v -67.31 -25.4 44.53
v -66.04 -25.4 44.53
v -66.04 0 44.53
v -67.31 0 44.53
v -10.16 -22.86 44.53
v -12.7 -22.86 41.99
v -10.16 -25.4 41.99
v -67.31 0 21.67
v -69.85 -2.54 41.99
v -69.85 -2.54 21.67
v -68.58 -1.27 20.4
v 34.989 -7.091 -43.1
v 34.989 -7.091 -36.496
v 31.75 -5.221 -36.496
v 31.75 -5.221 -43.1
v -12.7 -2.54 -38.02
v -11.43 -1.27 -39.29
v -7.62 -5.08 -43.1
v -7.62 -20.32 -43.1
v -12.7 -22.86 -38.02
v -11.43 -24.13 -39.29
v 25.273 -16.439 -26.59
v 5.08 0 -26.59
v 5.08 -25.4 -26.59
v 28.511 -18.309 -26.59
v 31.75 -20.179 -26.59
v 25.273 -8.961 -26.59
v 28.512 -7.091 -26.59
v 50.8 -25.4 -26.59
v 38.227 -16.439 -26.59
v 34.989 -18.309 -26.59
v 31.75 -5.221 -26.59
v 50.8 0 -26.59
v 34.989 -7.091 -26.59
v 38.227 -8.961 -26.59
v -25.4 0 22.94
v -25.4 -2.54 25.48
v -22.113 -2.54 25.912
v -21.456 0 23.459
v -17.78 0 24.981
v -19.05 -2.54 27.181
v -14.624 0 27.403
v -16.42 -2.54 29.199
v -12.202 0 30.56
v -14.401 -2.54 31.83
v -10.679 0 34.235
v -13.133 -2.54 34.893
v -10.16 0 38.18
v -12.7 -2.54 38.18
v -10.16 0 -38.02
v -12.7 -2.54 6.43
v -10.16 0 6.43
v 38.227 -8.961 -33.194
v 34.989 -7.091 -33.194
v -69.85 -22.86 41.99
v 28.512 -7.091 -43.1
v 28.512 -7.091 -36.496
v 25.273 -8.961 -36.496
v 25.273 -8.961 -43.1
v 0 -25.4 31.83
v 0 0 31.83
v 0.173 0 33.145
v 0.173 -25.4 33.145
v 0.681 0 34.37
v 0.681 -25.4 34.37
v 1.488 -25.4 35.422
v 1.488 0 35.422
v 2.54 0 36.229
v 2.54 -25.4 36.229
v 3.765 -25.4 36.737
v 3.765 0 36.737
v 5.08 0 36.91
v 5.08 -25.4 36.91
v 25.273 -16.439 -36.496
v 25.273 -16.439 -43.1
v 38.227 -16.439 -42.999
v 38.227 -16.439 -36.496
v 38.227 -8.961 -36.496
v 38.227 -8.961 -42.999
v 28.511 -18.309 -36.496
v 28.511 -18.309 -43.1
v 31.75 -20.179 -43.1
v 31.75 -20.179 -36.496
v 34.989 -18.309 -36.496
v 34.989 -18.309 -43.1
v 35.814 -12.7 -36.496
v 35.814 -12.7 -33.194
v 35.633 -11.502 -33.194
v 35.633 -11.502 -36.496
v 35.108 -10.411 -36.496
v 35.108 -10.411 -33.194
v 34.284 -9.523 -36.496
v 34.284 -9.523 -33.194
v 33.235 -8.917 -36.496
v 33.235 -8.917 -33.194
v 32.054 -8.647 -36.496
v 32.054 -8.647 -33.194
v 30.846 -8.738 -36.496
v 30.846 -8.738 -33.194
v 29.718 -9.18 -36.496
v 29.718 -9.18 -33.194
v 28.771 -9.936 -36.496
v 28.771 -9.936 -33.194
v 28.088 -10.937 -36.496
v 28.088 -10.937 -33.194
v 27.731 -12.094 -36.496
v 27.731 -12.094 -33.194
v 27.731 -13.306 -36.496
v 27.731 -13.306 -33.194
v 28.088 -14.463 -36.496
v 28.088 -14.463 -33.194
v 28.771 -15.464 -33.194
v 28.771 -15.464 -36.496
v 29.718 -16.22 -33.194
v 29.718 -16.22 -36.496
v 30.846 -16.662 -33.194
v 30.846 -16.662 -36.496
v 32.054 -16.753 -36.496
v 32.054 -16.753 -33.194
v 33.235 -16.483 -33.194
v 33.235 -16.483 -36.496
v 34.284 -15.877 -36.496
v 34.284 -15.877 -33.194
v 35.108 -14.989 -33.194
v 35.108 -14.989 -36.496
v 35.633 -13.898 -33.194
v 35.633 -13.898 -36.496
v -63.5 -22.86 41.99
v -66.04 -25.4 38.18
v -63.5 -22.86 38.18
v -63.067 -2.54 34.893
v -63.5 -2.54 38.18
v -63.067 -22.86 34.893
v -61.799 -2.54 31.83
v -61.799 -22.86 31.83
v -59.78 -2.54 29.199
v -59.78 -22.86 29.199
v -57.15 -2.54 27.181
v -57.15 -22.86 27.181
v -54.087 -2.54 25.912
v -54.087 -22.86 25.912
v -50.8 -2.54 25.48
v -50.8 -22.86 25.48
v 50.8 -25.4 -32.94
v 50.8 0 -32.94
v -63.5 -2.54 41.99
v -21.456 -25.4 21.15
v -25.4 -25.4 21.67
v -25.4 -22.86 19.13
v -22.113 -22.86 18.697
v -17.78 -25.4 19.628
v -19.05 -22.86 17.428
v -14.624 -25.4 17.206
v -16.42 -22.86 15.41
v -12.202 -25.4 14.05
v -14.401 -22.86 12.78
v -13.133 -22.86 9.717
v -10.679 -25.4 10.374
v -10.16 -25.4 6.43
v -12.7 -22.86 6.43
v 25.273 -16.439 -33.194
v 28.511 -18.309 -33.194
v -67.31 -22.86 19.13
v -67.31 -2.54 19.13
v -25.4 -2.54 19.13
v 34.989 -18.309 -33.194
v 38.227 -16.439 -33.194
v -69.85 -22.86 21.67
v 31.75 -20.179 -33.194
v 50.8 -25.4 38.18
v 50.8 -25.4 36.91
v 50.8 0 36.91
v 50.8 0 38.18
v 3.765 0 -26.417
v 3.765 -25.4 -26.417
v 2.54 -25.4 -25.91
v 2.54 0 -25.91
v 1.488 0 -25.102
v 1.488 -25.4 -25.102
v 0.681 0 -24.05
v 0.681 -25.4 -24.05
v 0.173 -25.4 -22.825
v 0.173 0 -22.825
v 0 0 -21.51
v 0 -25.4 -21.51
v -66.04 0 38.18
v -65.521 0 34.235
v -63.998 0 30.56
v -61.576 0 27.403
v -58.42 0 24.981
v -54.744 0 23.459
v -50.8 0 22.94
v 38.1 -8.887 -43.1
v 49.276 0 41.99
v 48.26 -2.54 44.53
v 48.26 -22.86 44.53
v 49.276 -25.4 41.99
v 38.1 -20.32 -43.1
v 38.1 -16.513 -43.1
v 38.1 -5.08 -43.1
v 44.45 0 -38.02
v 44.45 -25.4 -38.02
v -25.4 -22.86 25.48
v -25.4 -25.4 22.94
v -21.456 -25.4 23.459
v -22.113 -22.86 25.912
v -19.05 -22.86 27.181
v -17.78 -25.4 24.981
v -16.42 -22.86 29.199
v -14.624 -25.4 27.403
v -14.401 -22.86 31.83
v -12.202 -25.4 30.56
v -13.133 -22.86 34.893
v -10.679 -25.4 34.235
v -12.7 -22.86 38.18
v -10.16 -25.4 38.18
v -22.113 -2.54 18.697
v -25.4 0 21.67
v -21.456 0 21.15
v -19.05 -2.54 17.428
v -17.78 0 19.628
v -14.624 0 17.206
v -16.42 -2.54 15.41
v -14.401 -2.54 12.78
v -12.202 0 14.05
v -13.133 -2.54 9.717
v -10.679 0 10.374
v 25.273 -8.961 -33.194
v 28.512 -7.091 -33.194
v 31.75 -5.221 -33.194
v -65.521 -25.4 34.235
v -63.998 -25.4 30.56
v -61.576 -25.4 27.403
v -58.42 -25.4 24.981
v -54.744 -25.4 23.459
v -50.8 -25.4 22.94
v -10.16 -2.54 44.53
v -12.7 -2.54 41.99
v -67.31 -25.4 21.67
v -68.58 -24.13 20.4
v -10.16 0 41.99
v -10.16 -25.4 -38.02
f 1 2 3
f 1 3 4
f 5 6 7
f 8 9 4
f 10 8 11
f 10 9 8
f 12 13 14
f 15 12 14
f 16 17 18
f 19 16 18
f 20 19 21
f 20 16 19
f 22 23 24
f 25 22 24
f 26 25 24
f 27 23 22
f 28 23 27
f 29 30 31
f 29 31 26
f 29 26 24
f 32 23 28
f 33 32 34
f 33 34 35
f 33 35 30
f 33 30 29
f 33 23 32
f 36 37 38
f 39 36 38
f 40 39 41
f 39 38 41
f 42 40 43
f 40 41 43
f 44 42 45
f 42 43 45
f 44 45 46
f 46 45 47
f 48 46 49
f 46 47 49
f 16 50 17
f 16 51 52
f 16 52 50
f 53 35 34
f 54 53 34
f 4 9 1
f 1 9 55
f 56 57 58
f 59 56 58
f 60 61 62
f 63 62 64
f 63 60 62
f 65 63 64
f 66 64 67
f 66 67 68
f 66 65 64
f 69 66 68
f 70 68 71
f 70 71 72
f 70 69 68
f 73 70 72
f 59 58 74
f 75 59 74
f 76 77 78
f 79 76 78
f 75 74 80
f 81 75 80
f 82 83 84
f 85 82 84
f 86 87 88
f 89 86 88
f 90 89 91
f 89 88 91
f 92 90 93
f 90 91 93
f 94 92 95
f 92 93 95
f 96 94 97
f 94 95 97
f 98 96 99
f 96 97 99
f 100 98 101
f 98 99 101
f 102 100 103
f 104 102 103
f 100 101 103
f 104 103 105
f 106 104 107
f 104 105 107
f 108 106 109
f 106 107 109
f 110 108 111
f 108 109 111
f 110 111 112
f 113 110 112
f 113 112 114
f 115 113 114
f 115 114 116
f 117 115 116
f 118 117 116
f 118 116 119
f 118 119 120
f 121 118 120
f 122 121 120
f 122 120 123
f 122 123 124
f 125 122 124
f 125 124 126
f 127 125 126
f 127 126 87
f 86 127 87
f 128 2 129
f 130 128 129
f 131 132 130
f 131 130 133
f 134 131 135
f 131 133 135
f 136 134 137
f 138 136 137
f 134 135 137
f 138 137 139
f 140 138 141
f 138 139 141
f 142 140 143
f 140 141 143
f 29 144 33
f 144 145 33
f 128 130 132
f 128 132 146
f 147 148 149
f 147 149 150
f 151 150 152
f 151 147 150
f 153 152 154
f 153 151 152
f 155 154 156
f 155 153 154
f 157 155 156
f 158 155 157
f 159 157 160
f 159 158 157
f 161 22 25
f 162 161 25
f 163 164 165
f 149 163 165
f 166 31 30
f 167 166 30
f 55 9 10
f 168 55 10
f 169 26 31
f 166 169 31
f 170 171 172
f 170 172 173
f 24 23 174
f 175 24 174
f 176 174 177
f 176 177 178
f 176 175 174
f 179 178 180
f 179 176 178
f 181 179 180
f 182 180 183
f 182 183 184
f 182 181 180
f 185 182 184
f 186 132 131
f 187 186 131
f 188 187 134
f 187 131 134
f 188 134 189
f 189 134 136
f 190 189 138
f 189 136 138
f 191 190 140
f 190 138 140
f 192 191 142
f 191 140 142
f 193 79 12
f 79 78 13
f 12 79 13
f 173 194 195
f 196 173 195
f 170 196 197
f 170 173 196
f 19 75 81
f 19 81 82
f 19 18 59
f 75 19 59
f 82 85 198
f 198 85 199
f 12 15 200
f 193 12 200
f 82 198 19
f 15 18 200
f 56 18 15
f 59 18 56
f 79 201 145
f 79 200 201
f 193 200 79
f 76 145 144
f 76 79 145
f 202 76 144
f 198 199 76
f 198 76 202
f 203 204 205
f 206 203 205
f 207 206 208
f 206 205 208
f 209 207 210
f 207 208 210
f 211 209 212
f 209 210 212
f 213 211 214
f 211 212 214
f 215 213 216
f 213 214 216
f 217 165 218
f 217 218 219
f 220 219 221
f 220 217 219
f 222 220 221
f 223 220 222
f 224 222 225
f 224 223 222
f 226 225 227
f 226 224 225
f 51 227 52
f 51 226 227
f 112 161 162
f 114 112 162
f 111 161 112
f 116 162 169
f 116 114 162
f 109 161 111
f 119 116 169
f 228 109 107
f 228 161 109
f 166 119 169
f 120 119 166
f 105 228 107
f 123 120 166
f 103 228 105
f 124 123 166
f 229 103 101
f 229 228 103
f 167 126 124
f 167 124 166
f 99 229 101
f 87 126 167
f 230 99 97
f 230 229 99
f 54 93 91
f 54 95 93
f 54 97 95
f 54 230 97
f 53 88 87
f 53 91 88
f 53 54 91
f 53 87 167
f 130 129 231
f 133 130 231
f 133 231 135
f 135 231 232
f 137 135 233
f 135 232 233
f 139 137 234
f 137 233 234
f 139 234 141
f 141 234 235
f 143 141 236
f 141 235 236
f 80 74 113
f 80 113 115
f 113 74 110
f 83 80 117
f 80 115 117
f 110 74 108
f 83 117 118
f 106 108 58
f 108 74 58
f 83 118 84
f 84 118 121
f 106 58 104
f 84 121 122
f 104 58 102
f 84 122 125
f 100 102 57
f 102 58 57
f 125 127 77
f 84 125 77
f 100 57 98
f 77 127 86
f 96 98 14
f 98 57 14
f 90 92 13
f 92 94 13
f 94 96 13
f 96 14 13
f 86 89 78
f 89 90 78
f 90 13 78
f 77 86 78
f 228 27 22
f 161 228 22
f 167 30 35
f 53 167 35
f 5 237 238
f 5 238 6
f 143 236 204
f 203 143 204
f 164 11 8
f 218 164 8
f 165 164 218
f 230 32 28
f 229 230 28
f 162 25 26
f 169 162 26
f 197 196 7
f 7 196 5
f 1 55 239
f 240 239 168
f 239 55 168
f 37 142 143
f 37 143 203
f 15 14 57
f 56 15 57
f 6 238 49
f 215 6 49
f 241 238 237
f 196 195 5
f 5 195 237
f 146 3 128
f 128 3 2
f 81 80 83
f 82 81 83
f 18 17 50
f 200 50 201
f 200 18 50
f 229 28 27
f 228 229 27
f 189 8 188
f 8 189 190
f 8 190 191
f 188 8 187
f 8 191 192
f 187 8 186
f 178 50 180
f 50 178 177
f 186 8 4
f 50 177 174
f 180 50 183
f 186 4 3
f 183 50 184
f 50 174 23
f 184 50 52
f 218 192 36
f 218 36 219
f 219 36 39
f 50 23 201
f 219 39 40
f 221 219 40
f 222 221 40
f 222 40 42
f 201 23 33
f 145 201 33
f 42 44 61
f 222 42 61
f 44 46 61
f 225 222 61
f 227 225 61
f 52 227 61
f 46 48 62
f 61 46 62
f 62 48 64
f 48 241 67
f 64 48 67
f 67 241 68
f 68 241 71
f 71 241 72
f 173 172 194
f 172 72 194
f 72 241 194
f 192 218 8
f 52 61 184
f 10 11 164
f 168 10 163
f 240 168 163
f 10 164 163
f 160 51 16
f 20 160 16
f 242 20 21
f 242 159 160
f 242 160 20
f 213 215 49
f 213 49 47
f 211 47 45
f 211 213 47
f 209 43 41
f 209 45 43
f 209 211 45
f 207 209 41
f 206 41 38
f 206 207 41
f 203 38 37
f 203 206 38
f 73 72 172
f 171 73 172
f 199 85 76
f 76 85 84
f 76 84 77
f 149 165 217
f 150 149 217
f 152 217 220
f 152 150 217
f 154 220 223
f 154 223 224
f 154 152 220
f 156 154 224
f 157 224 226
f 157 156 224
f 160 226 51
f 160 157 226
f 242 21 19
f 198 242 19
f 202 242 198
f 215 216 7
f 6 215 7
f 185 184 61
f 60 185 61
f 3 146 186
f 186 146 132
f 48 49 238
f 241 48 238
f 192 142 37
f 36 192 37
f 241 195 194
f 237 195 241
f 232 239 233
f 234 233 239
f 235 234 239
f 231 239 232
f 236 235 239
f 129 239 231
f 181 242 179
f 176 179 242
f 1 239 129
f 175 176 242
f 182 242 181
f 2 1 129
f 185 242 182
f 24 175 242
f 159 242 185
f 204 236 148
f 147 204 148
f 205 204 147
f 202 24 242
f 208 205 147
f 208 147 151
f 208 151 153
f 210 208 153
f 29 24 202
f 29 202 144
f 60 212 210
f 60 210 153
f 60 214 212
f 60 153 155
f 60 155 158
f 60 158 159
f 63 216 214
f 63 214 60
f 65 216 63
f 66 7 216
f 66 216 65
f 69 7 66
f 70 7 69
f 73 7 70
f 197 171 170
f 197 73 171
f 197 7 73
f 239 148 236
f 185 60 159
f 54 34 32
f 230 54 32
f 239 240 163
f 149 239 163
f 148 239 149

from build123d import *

# Parameters (mm, degrees)
F0_W       = 50.8
F0_H       = 6.35
F0_H_2     = 7.62
F0_H_3     = 16.51
F1_DEPTH   = 25.4
F2_R       = 12.7
F3_SIZE    = 2.54
F4_R       = 12.7
F5_SIZE    = 2.54
F6_R       = 5.08
F8_C1_SIZE = 5.08
F8_C2_SIZE = 5.08
F8_C3_SIZE = 5.08
F9_SIZE2   = 12.7
F9_SIZE    = 10.16
F10_SIZE2  = 6.35
F10_SIZE   = 2.54
F11_DEPTH  = 6.604
F12_START  = -9.906
F12_DEPTH  = 6.605
F13_D      = 8.128
F13_DEPTH  = 16.511


with BuildPart() as f1:
    # F0 (on Front) → F1 (new body)
    with BuildSketch(Plane.XZ):
        Polygon((-63.5, 19.1297054841), (-63.5, 25.4797054841), (-63.5, 44.5297054841), (-69.85, 44.5297054841), (-69.85, 19.1297054841), align=None)
        with Locations((-38.1, 22.3047054841)):
            Rectangle(F0_W, F0_H)
        Polygon((0, 36.9097054841), (0, 44.5297054841), (-12.7, 44.5297054841), (-12.7, 25.4797054841), (-12.7, 19.1297054841), (-12.7, -43.1002945159), (0, -43.1002945159), (0, -26.5902945159), align=None)
        with Locations((25.4, 40.7197054841)):
            Rectangle(F0_W, F0_H_2)
        with Locations((25.4, -34.8452945159)):
            Rectangle(F0_W, F0_H_3)
    extrude(amount=F1_DEPTH)

    # F2
    f2_edges = [f1.edges().sort_by_distance(p)[0] for p in [
        (-12.7, -12.7, 25.479705),
        (-63.5, -12.7, 25.479705),
    ]]
    fillet(f2_edges, radius=F2_R)

    # F3
    f3_edges = [f1.edges().sort_by_distance(p)[0] for p in [
        (-63.5, -12.7, 44.529705),
        (-69.85, 0, 31.829705),
        (-69.85, -12.7, 44.529705),
        (-69.85, -25.4, 31.829705),
        (-59.780256, -25.4, 29.199449),
        (-38.1, 0, 25.479705),
        (-12.7, -12.7, 44.529705),
        (19.05, -25.4, 44.529705),
        (19.05, 0, 44.529705),
        (-69.85, -12.7, 19.129705),
    ]]
    chamfer(f3_edges, length=F3_SIZE)

    # F4
    f4_edges = [f1.edges().sort_by_distance(p)[0] for p in [
        (-12.7, -12.7, 19.129705),
    ]]
    fillet(f4_edges, radius=F4_R)

    # F5
    f5_edges = [f1.edges().sort_by_distance(p)[0] for p in [
        (-12.7, -25.4, -18.335295),
        (-12.7, 0, -18.335295),
    ]]
    chamfer(f5_edges, length=F5_SIZE)

    # F6
    f6_edges = [f1.edges().sort_by_distance(p)[0] for p in [
        (0, -12.7, 36.909705),
        (0, -12.7, -26.590295),
    ]]
    fillet(f6_edges, radius=F6_R)

    # F8: chamfer of 5.08 on 5 edges, made by hand

    # F8_c1
    f8_c1_edges = [f1.edges().sort_by_distance(p)[0] for p in [
        (20.32, 0, -43.1002945159),
    ]]
    chamfer(f8_c1_edges, length=F8_C1_SIZE)

    # F8_c2
    f8_c2_edges = [f1.edges().sort_by_distance(p)[0] for p in [
        (-12.7, -13.97, -43.1002945159),
    ]]
    chamfer(f8_c2_edges, length=F8_C2_SIZE)

    # F8_c3
    f8_c3_edges = [f1.edges().sort_by_distance(p)[0] for p in [
        (21.59, -25.4, -43.1002945159),
    ]]
    chamfer(f8_c3_edges, length=F8_C3_SIZE)

    # F9
    f9_edges = [f1.edges().sort_by_distance(p)[0] for p in [
        (50.8, -12.7, -43.100295),
    ]]
    f9_side = f1.faces().sort_by_distance((50.8, -12.7, -34.415021))[0]
    chamfer(f9_edges, length=F9_SIZE, length2=F9_SIZE2, reference=f9_side)

    # F10
    f10_edges = [f1.edges().sort_by_distance(p)[0] for p in [
        (50.8, -12.7, 44.529705),
    ]]
    f10_side = f1.faces().sort_by_distance((20.32, -12.7, 44.529705))[0]
    chamfer(f10_edges, length=F10_SIZE, length2=F10_SIZE2, reference=f10_side)

    # F7 (on face) → F11 (cut)
    with BuildSketch(Plane.XY.offset(-26.5902945159)):
        with BuildLine():
            Line((25.273, -16.4394976935), (28.5114998927, -18.3092464784))
            ThreePointArc((28.5114998927, -18.3092464784), (26.1407534287, -15.9384999464), (25.273, -12.7))
            Line((25.273, -12.7), (25.273, -16.4394976935))
        make_face()
        with BuildLine():
            ThreePointArc((25.273, -12.7), (26.1407534711, -9.4614999803), (28.5115000394, -7.0907534369))
            Line((28.5115000394, -7.0907534369), (25.273, -8.9605023065))
            Line((25.273, -8.9605023065), (25.273, -12.7))
        make_face()
        with BuildLine():
            ThreePointArc((28.5115000394, -7.0907534369), (31.7500001819, -6.223), (34.9885002756, -7.0907536188))
            Line((34.9885002756, -7.0907536188), (31.75, -5.2210046129))
            Line((31.75, -5.2210046129), (28.5115000394, -7.0907534369))
        make_face()
        with BuildLine():
            ThreePointArc((34.9885002756, -7.0907536188), (37.3592466199, -9.4615001378), (38.227, -12.7))
            Line((38.227, -12.7), (38.227, -8.9605023065))
            Line((38.227, -8.9605023065), (34.9885002756, -7.0907536188))
        make_face()
        with BuildLine():
            Line((38.227, -16.4394976935), (38.227, -12.7))
            ThreePointArc((38.227, -12.7), (37.3592466025, -15.9384998923), (34.9885002155, -18.3092464159))
            Line((34.9885002155, -18.3092464159), (38.227, -16.4394976935))
        make_face()
        with BuildLine():
            Line((31.75, -20.1789953871), (34.9885002155, -18.3092464159))
            ThreePointArc((34.9885002155, -18.3092464159), (31.7500000625, -19.177), (28.5114998927, -18.3092464784))
            Line((28.5114998927, -18.3092464784), (31.75, -20.1789953871))
        make_face()
        with BuildLine():
            ThreePointArc((34.9885002155, -18.3092464159), (37.3592466025, -15.9384998923), (38.227, -12.7))
            ThreePointArc((38.227, -12.7), (37.3592466199, -9.4615001378), (34.9885002756, -7.0907536188))
            ThreePointArc((34.9885002756, -7.0907536188), (31.7500001819, -6.223), (28.5115000394, -7.0907534369))
            ThreePointArc((28.5115000394, -7.0907534369), (26.1407534711, -9.4614999803), (25.273, -12.7))
            ThreePointArc((25.273, -12.7), (26.1407534287, -15.9384999464), (28.5114998927, -18.3092464784))
            ThreePointArc((28.5114998927, -18.3092464784), (31.7500000625, -19.177), (34.9885002155, -18.3092464159))
        make_face()
    extrude(amount=-F11_DEPTH, mode=Mode.SUBTRACT)

    # F7 (on face) → F12 (cut)
    with BuildSketch(Plane.XY.offset(-26.5902945159).offset(F12_START)):
        with BuildLine():
            ThreePointArc((34.9885002155, -18.3092464159), (37.3592466025, -15.9384998923), (38.227, -12.7))
            ThreePointArc((38.227, -12.7), (37.3592466199, -9.4615001378), (34.9885002756, -7.0907536188))
            ThreePointArc((34.9885002756, -7.0907536188), (31.7500001819, -6.223), (28.5115000394, -7.0907534369))
            ThreePointArc((28.5115000394, -7.0907534369), (26.1407534711, -9.4614999803), (25.273, -12.7))
            ThreePointArc((25.273, -12.7), (26.1407534287, -15.9384999464), (28.5114998927, -18.3092464784))
            ThreePointArc((28.5114998927, -18.3092464784), (31.7500000625, -19.177), (34.9885002155, -18.3092464159))
        make_face()
        with BuildLine():
            Line((38.227, -16.4394976935), (38.227, -12.7))
            ThreePointArc((38.227, -12.7), (37.3592466025, -15.9384998923), (34.9885002155, -18.3092464159))
            Line((34.9885002155, -18.3092464159), (38.227, -16.4394976935))
        make_face()
        with BuildLine():
            ThreePointArc((28.5115000394, -7.0907534369), (31.7500001819, -6.223), (34.9885002756, -7.0907536188))
            Line((34.9885002756, -7.0907536188), (31.75, -5.2210046129))
            Line((31.75, -5.2210046129), (28.5115000394, -7.0907534369))
        make_face()
        with BuildLine():
            ThreePointArc((34.9885002756, -7.0907536188), (37.3592466199, -9.4615001378), (38.227, -12.7))
            Line((38.227, -12.7), (38.227, -8.9605023065))
            Line((38.227, -8.9605023065), (34.9885002756, -7.0907536188))
        make_face()
        with BuildLine():
            ThreePointArc((25.273, -12.7), (26.1407534711, -9.4614999803), (28.5115000394, -7.0907534369))
            Line((28.5115000394, -7.0907534369), (25.273, -8.9605023065))
            Line((25.273, -8.9605023065), (25.273, -12.7))
        make_face()
        with BuildLine():
            Line((25.273, -16.4394976935), (28.5114998927, -18.3092464784))
            ThreePointArc((28.5114998927, -18.3092464784), (26.1407534287, -15.9384999464), (25.273, -12.7))
            Line((25.273, -12.7), (25.273, -16.4394976935))
        make_face()
        with BuildLine():
            Line((31.75, -20.1789953871), (34.9885002155, -18.3092464159))
            ThreePointArc((34.9885002155, -18.3092464159), (31.7500000625, -19.177), (28.5114998927, -18.3092464784))
            Line((28.5114998927, -18.3092464784), (31.75, -20.1789953871))
        make_face()
    extrude(amount=-F12_DEPTH, mode=Mode.SUBTRACT)

    # F13 (through all, one way)
    with BuildSketch(Plane.XY.offset(-26.5902945159)):
        with Locations((31.75, -12.7)):
            Circle(F13_D / 2)
    extrude(amount=-F13_DEPTH, mode=Mode.SUBTRACT)


solid = f1.part
